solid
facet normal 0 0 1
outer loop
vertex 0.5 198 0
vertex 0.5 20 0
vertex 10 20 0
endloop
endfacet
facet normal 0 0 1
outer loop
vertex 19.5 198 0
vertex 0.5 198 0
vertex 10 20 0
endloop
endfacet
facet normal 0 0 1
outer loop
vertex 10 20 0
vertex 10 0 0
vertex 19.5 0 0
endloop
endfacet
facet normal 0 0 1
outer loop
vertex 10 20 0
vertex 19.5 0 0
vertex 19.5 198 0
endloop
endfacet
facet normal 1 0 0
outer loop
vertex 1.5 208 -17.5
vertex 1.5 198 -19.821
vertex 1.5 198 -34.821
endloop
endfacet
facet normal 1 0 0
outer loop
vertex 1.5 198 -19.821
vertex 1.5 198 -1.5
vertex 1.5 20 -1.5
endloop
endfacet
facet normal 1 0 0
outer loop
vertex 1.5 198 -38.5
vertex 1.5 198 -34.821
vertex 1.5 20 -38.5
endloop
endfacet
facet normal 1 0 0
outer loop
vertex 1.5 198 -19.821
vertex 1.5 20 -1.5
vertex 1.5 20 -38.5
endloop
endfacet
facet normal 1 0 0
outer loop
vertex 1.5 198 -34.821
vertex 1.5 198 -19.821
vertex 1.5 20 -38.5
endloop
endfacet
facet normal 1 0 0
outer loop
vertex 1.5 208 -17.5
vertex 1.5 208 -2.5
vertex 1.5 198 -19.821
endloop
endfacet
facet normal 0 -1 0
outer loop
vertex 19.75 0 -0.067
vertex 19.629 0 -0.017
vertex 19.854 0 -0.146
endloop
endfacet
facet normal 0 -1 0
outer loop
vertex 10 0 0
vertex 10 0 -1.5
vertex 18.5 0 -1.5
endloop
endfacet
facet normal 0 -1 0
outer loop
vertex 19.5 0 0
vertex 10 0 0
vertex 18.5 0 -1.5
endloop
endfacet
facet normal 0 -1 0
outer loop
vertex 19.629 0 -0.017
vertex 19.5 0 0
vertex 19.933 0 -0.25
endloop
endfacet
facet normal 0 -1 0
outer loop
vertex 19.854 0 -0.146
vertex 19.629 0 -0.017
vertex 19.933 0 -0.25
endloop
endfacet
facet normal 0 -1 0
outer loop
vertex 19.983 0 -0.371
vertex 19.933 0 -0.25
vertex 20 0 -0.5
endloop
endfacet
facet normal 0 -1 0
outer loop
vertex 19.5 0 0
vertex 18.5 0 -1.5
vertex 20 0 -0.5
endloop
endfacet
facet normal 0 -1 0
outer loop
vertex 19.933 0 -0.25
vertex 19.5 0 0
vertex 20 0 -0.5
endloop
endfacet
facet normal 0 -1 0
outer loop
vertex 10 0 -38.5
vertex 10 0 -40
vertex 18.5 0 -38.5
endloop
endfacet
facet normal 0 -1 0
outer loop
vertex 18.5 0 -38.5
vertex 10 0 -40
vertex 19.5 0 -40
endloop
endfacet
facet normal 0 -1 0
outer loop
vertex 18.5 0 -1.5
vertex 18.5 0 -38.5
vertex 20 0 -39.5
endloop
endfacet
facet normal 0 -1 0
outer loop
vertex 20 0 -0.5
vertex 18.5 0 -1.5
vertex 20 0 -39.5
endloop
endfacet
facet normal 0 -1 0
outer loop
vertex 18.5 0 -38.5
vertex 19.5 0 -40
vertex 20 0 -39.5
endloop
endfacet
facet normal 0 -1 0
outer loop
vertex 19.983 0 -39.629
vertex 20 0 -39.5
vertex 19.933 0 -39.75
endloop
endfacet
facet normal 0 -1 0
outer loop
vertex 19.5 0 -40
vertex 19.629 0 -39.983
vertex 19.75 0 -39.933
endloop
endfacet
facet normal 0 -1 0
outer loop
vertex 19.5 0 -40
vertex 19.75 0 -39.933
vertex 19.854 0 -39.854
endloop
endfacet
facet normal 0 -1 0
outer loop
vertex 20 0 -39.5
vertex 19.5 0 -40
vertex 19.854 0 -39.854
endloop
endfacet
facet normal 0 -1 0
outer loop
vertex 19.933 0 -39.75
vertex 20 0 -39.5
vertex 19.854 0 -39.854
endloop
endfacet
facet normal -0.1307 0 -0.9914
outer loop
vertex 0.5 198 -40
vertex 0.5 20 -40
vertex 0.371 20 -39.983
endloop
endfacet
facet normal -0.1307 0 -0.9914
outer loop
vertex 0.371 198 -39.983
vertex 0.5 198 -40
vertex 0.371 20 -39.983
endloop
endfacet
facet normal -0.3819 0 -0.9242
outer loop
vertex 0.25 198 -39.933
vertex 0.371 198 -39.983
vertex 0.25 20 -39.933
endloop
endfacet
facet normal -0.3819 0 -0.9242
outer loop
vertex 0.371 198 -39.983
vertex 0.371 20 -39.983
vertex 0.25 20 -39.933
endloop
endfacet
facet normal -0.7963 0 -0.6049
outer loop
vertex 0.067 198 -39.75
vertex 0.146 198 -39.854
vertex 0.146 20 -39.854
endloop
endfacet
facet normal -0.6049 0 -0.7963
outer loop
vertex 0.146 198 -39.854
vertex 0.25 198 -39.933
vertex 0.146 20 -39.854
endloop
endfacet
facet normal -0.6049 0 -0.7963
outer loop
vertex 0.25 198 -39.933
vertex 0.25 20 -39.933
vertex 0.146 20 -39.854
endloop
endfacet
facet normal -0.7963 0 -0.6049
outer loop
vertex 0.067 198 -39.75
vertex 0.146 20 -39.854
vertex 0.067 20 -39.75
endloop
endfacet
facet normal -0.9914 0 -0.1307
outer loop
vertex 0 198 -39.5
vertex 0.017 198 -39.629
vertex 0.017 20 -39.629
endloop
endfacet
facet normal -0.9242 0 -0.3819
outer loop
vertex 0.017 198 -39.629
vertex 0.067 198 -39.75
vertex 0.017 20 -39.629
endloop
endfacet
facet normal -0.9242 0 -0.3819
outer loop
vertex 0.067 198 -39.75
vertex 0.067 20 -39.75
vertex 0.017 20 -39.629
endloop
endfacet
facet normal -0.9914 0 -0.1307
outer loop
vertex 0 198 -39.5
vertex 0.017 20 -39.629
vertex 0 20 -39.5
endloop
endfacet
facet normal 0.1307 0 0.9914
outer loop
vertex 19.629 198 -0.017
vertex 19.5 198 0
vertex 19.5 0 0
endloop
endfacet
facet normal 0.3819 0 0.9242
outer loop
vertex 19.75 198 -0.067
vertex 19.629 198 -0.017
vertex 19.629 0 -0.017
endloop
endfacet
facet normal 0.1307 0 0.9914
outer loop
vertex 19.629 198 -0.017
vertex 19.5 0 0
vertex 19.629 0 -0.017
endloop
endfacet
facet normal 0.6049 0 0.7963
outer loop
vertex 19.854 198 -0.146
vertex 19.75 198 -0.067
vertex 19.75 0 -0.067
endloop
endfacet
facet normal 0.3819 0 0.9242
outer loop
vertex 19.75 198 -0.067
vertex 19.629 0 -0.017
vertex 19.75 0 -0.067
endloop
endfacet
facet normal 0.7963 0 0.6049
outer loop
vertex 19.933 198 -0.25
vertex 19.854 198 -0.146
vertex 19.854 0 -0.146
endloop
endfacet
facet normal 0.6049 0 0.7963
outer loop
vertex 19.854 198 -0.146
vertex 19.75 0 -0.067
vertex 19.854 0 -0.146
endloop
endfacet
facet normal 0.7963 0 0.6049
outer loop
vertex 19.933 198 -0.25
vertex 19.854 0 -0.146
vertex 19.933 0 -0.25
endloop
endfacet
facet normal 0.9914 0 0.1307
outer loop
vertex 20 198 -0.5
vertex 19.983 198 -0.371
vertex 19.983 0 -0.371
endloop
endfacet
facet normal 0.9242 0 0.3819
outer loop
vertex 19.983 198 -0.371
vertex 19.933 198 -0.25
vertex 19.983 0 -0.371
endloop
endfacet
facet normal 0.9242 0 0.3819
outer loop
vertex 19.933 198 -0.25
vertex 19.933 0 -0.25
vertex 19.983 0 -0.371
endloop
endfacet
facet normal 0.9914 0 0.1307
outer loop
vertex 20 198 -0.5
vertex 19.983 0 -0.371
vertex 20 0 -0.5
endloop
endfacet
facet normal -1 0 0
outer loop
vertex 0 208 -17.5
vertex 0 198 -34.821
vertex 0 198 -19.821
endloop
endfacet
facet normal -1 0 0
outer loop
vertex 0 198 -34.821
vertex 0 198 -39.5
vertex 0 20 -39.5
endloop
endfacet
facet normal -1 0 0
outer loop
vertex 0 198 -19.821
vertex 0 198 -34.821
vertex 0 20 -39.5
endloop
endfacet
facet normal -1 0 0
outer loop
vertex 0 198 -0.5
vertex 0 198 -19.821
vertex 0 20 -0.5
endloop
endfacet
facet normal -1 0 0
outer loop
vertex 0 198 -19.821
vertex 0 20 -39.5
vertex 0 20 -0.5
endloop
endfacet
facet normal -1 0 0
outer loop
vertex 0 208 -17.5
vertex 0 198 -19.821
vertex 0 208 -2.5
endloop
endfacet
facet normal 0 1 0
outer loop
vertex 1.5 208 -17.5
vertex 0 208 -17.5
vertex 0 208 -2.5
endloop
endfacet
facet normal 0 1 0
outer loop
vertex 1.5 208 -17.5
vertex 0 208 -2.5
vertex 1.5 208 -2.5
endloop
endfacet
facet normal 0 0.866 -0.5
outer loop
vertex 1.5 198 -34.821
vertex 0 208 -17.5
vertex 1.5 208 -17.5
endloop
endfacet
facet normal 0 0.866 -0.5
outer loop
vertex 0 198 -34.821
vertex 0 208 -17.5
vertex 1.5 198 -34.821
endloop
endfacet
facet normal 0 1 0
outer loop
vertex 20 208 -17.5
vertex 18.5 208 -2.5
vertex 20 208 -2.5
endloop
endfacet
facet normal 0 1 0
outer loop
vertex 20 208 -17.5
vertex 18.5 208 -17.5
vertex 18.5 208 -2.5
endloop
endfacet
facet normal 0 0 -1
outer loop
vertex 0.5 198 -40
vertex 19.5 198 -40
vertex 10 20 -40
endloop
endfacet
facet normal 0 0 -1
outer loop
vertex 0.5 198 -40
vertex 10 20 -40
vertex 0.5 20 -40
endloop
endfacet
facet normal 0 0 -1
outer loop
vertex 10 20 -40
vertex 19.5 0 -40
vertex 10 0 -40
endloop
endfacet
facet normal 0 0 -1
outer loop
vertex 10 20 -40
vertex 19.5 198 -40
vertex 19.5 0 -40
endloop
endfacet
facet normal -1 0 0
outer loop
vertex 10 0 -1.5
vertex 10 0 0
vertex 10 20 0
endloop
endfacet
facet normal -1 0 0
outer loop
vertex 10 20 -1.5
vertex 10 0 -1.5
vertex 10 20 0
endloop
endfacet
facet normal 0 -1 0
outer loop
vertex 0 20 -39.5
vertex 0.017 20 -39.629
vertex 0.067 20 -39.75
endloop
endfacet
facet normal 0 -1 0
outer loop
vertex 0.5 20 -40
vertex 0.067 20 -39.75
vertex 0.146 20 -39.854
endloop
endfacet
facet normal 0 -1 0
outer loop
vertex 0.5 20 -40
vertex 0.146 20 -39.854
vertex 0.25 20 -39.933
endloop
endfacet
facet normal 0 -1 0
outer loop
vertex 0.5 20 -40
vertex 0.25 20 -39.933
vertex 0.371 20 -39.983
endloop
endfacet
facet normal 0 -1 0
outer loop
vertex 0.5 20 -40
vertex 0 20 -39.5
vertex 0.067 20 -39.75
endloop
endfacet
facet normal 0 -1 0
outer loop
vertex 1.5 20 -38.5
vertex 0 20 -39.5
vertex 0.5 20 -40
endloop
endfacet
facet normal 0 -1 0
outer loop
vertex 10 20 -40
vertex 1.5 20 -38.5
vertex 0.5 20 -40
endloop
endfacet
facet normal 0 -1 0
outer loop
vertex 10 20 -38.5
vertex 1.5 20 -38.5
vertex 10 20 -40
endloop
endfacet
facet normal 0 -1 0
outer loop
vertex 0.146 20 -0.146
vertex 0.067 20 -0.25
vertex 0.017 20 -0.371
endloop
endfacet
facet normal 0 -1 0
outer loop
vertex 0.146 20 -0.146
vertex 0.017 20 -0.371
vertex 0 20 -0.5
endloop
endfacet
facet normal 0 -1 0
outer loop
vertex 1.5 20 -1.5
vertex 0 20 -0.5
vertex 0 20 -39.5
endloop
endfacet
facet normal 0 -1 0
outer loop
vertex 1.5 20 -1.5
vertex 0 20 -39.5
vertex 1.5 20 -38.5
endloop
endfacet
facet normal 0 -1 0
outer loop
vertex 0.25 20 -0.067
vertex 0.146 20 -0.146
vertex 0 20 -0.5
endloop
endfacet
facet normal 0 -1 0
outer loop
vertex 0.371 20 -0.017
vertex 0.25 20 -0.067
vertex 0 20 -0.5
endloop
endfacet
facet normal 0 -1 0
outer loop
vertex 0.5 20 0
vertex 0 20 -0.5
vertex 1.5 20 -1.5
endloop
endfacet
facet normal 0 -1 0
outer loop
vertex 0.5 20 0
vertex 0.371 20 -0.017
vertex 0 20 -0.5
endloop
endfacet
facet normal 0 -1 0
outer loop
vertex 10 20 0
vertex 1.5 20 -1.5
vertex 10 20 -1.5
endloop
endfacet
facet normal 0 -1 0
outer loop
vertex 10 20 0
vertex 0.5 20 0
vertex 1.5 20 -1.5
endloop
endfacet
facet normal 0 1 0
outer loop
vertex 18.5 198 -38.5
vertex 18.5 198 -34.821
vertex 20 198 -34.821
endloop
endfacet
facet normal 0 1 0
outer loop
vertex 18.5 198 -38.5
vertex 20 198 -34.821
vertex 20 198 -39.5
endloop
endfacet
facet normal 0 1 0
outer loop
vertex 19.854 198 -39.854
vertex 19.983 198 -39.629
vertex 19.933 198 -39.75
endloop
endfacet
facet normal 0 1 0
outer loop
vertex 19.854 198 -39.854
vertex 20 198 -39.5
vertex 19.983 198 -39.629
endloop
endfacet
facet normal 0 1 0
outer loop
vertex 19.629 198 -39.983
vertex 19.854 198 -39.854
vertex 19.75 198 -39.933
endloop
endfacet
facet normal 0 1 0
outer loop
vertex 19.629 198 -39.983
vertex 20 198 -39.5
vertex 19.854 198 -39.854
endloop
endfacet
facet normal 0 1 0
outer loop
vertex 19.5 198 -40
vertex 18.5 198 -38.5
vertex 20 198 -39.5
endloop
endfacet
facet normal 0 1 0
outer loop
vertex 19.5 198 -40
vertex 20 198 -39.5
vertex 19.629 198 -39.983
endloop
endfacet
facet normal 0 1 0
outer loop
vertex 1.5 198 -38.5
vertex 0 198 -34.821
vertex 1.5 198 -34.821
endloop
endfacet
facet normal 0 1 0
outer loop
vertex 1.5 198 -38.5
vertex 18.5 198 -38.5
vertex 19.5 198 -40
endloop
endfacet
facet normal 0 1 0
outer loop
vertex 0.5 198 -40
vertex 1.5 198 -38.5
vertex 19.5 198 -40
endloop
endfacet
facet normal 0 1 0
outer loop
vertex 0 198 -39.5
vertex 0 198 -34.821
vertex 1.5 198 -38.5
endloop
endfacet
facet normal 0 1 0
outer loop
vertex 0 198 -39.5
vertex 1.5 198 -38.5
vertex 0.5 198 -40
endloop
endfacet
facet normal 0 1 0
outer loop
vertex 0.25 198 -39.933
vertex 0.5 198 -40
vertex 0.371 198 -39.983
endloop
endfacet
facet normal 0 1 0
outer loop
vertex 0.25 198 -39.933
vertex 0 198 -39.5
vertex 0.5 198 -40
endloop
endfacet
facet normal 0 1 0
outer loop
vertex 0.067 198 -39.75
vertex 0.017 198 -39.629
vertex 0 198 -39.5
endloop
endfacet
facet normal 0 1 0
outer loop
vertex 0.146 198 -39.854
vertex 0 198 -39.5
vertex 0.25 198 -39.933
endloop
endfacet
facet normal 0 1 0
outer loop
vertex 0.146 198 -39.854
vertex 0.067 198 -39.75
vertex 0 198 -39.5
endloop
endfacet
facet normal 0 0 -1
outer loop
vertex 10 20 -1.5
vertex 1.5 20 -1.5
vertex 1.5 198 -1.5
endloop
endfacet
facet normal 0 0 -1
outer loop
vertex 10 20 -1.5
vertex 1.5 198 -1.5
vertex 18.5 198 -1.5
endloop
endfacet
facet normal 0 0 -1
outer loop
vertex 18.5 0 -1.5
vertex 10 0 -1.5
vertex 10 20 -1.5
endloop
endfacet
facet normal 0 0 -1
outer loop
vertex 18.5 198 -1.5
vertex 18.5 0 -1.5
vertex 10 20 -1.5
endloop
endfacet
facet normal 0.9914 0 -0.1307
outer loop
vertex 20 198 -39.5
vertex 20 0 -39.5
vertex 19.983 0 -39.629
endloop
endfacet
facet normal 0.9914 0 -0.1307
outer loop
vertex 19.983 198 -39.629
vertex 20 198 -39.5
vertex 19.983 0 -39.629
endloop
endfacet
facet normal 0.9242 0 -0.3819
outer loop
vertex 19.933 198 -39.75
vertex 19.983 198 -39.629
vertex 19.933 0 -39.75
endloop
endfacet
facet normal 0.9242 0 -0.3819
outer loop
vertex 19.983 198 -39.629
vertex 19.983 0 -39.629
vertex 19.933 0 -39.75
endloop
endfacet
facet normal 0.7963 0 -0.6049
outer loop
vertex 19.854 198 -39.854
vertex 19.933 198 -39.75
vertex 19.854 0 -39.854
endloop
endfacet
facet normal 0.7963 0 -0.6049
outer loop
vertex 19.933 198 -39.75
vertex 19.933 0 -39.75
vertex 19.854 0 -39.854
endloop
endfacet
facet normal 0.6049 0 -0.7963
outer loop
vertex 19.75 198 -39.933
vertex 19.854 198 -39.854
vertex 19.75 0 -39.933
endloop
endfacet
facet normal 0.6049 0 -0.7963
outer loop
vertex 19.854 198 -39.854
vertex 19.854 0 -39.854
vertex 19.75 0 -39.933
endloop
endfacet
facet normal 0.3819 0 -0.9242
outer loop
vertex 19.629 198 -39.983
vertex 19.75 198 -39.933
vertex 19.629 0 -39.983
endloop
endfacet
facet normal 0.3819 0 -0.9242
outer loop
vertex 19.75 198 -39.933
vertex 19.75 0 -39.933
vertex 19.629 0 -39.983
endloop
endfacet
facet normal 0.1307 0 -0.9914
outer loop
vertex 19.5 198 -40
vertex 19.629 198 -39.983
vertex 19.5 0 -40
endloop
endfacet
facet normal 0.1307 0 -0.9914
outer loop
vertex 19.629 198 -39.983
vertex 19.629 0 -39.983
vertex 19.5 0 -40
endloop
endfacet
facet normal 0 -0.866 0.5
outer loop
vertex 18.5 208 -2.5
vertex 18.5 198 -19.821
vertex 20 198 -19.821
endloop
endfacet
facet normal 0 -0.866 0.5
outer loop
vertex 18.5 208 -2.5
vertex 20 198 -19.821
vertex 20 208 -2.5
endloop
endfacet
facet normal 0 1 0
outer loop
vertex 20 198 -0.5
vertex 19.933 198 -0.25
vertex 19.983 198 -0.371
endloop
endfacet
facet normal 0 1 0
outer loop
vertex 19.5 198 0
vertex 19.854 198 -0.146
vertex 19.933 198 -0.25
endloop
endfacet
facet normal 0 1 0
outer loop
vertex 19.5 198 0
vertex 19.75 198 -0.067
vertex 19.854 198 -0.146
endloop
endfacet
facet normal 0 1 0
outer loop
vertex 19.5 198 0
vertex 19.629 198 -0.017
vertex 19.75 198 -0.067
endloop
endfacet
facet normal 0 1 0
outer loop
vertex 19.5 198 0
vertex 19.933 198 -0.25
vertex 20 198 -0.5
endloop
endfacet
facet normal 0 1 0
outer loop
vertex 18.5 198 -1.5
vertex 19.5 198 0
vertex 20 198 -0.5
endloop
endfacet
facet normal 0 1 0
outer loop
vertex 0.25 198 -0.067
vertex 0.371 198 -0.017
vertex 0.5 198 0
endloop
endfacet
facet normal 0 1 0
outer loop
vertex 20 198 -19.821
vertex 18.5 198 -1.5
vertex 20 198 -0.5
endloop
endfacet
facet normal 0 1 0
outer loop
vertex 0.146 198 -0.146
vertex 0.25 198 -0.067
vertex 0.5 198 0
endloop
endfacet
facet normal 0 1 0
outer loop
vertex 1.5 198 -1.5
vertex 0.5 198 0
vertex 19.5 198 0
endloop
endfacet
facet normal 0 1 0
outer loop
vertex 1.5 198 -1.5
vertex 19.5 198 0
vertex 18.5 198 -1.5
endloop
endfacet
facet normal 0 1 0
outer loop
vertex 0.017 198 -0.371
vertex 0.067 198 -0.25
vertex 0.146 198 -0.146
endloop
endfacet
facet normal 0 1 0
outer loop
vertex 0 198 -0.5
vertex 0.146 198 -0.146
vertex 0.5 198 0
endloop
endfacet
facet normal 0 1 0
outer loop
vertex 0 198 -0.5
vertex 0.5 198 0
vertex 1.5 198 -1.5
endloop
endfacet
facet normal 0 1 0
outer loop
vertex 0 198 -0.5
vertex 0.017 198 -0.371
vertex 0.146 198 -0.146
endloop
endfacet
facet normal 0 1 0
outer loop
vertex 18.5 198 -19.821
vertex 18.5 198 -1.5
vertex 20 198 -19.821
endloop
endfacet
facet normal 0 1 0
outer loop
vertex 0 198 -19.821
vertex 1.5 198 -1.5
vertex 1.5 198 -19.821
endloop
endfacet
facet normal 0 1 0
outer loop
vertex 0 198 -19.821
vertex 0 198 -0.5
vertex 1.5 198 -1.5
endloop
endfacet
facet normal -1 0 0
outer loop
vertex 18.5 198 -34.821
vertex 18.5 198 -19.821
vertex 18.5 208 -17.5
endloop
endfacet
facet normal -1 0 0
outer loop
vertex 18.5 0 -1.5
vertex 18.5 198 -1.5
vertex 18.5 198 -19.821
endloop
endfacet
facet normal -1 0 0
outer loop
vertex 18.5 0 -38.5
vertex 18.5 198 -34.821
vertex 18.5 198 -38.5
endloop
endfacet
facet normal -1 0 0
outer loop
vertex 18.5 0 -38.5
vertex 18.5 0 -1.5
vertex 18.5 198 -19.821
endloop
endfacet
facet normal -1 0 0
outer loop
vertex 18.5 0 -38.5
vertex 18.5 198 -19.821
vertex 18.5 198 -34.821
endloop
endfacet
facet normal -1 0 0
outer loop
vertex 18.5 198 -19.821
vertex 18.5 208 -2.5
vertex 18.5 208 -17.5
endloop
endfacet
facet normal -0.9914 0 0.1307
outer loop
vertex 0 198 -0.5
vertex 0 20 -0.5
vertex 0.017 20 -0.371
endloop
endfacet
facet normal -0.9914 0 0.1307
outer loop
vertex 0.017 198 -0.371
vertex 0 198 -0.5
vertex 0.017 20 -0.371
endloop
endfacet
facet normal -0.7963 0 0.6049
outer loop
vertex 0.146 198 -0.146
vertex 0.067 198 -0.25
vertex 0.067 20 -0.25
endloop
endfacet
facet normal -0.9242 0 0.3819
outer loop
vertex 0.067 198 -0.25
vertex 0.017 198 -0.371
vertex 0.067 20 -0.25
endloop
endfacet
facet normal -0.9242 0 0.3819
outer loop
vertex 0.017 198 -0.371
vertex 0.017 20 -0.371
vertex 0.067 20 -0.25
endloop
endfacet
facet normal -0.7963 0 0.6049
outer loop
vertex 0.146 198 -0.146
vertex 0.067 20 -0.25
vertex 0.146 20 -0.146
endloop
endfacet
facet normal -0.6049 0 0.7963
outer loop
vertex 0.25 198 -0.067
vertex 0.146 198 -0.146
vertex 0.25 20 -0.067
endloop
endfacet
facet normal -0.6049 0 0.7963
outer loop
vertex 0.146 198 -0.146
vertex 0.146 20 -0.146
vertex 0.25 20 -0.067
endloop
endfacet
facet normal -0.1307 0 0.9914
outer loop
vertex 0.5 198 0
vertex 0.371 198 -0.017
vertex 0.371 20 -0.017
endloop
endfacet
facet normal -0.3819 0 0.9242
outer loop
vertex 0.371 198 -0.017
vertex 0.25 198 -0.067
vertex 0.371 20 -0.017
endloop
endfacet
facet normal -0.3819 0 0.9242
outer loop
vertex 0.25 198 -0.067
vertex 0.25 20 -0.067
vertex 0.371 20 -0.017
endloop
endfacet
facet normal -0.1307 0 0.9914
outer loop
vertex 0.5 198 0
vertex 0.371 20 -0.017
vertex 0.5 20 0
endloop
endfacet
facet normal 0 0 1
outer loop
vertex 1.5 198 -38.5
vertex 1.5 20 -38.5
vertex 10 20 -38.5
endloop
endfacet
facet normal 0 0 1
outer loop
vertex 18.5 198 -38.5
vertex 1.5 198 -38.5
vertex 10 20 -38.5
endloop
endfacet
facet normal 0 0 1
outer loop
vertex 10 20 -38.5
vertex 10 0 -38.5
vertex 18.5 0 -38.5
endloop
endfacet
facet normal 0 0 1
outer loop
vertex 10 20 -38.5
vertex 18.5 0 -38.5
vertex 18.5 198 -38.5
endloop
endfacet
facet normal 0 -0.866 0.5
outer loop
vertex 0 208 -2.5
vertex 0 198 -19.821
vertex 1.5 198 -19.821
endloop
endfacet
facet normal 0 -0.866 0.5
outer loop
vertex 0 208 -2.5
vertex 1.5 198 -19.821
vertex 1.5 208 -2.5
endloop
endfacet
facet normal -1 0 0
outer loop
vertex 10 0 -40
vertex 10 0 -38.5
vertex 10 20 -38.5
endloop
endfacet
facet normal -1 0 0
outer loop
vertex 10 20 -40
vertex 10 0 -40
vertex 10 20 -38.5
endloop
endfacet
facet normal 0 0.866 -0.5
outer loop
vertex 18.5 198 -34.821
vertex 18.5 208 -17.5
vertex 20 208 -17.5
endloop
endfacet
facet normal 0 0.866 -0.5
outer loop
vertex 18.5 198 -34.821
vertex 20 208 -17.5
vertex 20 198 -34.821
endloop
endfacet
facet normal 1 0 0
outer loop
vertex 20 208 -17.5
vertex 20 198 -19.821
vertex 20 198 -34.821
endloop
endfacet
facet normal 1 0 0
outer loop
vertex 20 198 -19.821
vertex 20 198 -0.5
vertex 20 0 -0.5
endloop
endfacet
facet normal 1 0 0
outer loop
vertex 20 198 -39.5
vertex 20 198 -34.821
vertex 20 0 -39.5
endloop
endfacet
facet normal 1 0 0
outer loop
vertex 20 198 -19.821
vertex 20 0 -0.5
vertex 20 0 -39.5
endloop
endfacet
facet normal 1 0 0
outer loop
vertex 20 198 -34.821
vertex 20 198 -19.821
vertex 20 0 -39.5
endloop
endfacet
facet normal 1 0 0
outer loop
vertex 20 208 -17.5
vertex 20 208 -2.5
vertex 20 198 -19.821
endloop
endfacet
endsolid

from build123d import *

# Parameters (mm, degrees)
SKETCH1_W           = 17
SKETCH1_H           = 37
BOSS_EXTRUDE1_DEPTH = 208
SKETCH2_W           = 10
SKETCH2_H           = 20
CUT_EXTRUDE1_DEPTH  = 40
CUT_EXTRUDE2_DEPTH  = 40


with BuildPart() as part:
    # Sketch1 → Boss-Extrude1 (new body)
    with BuildSketch(Plane(origin=(0, 0, 0), x_dir=(1, 0, 0), z_dir=(0, 1, 0))):
        with BuildLine():
            Line((0.5, 0), (19.5, 0))
            ThreePointArc((19.5, 0), (19.853553391, 0.146446609), (20, 0.5))
            Line((20, 0.5), (20, 39.5))
            ThreePointArc((20, 39.5), (19.853553391, 39.853553391), (19.5, 40))
            Line((19.5, 40), (0.5, 40))
            ThreePointArc((0.5, 40), (0.146446609, 39.853553391), (0, 39.5))
            Line((0, 39.5), (0, 0.5))
            ThreePointArc((0, 0.5), (0.146446609, 0.146446609), (0.5, 0))
        make_face()
        with Locations((10, 20)):
            Rectangle(SKETCH1_W, SKETCH1_H, mode=Mode.SUBTRACT)
    extrude(amount=BOSS_EXTRUDE1_DEPTH)

    # Sketch2 → Cut-Extrude1 (cut)
    with BuildSketch(Plane.XY):
        with Locations((5, 10)):
            Rectangle(SKETCH2_W, SKETCH2_H)
    extrude(amount=-CUT_EXTRUDE1_DEPTH, mode=Mode.SUBTRACT)

    # Sketch3 → Cut-Extrude2 (cut)
    with BuildSketch(Plane(origin=(0, 0, 0), x_dir=(0, 0, -1), z_dir=(1, 0, 0))):
        Polygon((0, 208), (0, 198), (19.820508076, 198), (2.5, 208), align=None)
        Polygon((17.5, 208), (34.820508076, 198), (40, 198), (40, 208), align=None)
    extrude(amount=CUT_EXTRUDE2_DEPTH, mode=Mode.SUBTRACT)


solid = part.part
